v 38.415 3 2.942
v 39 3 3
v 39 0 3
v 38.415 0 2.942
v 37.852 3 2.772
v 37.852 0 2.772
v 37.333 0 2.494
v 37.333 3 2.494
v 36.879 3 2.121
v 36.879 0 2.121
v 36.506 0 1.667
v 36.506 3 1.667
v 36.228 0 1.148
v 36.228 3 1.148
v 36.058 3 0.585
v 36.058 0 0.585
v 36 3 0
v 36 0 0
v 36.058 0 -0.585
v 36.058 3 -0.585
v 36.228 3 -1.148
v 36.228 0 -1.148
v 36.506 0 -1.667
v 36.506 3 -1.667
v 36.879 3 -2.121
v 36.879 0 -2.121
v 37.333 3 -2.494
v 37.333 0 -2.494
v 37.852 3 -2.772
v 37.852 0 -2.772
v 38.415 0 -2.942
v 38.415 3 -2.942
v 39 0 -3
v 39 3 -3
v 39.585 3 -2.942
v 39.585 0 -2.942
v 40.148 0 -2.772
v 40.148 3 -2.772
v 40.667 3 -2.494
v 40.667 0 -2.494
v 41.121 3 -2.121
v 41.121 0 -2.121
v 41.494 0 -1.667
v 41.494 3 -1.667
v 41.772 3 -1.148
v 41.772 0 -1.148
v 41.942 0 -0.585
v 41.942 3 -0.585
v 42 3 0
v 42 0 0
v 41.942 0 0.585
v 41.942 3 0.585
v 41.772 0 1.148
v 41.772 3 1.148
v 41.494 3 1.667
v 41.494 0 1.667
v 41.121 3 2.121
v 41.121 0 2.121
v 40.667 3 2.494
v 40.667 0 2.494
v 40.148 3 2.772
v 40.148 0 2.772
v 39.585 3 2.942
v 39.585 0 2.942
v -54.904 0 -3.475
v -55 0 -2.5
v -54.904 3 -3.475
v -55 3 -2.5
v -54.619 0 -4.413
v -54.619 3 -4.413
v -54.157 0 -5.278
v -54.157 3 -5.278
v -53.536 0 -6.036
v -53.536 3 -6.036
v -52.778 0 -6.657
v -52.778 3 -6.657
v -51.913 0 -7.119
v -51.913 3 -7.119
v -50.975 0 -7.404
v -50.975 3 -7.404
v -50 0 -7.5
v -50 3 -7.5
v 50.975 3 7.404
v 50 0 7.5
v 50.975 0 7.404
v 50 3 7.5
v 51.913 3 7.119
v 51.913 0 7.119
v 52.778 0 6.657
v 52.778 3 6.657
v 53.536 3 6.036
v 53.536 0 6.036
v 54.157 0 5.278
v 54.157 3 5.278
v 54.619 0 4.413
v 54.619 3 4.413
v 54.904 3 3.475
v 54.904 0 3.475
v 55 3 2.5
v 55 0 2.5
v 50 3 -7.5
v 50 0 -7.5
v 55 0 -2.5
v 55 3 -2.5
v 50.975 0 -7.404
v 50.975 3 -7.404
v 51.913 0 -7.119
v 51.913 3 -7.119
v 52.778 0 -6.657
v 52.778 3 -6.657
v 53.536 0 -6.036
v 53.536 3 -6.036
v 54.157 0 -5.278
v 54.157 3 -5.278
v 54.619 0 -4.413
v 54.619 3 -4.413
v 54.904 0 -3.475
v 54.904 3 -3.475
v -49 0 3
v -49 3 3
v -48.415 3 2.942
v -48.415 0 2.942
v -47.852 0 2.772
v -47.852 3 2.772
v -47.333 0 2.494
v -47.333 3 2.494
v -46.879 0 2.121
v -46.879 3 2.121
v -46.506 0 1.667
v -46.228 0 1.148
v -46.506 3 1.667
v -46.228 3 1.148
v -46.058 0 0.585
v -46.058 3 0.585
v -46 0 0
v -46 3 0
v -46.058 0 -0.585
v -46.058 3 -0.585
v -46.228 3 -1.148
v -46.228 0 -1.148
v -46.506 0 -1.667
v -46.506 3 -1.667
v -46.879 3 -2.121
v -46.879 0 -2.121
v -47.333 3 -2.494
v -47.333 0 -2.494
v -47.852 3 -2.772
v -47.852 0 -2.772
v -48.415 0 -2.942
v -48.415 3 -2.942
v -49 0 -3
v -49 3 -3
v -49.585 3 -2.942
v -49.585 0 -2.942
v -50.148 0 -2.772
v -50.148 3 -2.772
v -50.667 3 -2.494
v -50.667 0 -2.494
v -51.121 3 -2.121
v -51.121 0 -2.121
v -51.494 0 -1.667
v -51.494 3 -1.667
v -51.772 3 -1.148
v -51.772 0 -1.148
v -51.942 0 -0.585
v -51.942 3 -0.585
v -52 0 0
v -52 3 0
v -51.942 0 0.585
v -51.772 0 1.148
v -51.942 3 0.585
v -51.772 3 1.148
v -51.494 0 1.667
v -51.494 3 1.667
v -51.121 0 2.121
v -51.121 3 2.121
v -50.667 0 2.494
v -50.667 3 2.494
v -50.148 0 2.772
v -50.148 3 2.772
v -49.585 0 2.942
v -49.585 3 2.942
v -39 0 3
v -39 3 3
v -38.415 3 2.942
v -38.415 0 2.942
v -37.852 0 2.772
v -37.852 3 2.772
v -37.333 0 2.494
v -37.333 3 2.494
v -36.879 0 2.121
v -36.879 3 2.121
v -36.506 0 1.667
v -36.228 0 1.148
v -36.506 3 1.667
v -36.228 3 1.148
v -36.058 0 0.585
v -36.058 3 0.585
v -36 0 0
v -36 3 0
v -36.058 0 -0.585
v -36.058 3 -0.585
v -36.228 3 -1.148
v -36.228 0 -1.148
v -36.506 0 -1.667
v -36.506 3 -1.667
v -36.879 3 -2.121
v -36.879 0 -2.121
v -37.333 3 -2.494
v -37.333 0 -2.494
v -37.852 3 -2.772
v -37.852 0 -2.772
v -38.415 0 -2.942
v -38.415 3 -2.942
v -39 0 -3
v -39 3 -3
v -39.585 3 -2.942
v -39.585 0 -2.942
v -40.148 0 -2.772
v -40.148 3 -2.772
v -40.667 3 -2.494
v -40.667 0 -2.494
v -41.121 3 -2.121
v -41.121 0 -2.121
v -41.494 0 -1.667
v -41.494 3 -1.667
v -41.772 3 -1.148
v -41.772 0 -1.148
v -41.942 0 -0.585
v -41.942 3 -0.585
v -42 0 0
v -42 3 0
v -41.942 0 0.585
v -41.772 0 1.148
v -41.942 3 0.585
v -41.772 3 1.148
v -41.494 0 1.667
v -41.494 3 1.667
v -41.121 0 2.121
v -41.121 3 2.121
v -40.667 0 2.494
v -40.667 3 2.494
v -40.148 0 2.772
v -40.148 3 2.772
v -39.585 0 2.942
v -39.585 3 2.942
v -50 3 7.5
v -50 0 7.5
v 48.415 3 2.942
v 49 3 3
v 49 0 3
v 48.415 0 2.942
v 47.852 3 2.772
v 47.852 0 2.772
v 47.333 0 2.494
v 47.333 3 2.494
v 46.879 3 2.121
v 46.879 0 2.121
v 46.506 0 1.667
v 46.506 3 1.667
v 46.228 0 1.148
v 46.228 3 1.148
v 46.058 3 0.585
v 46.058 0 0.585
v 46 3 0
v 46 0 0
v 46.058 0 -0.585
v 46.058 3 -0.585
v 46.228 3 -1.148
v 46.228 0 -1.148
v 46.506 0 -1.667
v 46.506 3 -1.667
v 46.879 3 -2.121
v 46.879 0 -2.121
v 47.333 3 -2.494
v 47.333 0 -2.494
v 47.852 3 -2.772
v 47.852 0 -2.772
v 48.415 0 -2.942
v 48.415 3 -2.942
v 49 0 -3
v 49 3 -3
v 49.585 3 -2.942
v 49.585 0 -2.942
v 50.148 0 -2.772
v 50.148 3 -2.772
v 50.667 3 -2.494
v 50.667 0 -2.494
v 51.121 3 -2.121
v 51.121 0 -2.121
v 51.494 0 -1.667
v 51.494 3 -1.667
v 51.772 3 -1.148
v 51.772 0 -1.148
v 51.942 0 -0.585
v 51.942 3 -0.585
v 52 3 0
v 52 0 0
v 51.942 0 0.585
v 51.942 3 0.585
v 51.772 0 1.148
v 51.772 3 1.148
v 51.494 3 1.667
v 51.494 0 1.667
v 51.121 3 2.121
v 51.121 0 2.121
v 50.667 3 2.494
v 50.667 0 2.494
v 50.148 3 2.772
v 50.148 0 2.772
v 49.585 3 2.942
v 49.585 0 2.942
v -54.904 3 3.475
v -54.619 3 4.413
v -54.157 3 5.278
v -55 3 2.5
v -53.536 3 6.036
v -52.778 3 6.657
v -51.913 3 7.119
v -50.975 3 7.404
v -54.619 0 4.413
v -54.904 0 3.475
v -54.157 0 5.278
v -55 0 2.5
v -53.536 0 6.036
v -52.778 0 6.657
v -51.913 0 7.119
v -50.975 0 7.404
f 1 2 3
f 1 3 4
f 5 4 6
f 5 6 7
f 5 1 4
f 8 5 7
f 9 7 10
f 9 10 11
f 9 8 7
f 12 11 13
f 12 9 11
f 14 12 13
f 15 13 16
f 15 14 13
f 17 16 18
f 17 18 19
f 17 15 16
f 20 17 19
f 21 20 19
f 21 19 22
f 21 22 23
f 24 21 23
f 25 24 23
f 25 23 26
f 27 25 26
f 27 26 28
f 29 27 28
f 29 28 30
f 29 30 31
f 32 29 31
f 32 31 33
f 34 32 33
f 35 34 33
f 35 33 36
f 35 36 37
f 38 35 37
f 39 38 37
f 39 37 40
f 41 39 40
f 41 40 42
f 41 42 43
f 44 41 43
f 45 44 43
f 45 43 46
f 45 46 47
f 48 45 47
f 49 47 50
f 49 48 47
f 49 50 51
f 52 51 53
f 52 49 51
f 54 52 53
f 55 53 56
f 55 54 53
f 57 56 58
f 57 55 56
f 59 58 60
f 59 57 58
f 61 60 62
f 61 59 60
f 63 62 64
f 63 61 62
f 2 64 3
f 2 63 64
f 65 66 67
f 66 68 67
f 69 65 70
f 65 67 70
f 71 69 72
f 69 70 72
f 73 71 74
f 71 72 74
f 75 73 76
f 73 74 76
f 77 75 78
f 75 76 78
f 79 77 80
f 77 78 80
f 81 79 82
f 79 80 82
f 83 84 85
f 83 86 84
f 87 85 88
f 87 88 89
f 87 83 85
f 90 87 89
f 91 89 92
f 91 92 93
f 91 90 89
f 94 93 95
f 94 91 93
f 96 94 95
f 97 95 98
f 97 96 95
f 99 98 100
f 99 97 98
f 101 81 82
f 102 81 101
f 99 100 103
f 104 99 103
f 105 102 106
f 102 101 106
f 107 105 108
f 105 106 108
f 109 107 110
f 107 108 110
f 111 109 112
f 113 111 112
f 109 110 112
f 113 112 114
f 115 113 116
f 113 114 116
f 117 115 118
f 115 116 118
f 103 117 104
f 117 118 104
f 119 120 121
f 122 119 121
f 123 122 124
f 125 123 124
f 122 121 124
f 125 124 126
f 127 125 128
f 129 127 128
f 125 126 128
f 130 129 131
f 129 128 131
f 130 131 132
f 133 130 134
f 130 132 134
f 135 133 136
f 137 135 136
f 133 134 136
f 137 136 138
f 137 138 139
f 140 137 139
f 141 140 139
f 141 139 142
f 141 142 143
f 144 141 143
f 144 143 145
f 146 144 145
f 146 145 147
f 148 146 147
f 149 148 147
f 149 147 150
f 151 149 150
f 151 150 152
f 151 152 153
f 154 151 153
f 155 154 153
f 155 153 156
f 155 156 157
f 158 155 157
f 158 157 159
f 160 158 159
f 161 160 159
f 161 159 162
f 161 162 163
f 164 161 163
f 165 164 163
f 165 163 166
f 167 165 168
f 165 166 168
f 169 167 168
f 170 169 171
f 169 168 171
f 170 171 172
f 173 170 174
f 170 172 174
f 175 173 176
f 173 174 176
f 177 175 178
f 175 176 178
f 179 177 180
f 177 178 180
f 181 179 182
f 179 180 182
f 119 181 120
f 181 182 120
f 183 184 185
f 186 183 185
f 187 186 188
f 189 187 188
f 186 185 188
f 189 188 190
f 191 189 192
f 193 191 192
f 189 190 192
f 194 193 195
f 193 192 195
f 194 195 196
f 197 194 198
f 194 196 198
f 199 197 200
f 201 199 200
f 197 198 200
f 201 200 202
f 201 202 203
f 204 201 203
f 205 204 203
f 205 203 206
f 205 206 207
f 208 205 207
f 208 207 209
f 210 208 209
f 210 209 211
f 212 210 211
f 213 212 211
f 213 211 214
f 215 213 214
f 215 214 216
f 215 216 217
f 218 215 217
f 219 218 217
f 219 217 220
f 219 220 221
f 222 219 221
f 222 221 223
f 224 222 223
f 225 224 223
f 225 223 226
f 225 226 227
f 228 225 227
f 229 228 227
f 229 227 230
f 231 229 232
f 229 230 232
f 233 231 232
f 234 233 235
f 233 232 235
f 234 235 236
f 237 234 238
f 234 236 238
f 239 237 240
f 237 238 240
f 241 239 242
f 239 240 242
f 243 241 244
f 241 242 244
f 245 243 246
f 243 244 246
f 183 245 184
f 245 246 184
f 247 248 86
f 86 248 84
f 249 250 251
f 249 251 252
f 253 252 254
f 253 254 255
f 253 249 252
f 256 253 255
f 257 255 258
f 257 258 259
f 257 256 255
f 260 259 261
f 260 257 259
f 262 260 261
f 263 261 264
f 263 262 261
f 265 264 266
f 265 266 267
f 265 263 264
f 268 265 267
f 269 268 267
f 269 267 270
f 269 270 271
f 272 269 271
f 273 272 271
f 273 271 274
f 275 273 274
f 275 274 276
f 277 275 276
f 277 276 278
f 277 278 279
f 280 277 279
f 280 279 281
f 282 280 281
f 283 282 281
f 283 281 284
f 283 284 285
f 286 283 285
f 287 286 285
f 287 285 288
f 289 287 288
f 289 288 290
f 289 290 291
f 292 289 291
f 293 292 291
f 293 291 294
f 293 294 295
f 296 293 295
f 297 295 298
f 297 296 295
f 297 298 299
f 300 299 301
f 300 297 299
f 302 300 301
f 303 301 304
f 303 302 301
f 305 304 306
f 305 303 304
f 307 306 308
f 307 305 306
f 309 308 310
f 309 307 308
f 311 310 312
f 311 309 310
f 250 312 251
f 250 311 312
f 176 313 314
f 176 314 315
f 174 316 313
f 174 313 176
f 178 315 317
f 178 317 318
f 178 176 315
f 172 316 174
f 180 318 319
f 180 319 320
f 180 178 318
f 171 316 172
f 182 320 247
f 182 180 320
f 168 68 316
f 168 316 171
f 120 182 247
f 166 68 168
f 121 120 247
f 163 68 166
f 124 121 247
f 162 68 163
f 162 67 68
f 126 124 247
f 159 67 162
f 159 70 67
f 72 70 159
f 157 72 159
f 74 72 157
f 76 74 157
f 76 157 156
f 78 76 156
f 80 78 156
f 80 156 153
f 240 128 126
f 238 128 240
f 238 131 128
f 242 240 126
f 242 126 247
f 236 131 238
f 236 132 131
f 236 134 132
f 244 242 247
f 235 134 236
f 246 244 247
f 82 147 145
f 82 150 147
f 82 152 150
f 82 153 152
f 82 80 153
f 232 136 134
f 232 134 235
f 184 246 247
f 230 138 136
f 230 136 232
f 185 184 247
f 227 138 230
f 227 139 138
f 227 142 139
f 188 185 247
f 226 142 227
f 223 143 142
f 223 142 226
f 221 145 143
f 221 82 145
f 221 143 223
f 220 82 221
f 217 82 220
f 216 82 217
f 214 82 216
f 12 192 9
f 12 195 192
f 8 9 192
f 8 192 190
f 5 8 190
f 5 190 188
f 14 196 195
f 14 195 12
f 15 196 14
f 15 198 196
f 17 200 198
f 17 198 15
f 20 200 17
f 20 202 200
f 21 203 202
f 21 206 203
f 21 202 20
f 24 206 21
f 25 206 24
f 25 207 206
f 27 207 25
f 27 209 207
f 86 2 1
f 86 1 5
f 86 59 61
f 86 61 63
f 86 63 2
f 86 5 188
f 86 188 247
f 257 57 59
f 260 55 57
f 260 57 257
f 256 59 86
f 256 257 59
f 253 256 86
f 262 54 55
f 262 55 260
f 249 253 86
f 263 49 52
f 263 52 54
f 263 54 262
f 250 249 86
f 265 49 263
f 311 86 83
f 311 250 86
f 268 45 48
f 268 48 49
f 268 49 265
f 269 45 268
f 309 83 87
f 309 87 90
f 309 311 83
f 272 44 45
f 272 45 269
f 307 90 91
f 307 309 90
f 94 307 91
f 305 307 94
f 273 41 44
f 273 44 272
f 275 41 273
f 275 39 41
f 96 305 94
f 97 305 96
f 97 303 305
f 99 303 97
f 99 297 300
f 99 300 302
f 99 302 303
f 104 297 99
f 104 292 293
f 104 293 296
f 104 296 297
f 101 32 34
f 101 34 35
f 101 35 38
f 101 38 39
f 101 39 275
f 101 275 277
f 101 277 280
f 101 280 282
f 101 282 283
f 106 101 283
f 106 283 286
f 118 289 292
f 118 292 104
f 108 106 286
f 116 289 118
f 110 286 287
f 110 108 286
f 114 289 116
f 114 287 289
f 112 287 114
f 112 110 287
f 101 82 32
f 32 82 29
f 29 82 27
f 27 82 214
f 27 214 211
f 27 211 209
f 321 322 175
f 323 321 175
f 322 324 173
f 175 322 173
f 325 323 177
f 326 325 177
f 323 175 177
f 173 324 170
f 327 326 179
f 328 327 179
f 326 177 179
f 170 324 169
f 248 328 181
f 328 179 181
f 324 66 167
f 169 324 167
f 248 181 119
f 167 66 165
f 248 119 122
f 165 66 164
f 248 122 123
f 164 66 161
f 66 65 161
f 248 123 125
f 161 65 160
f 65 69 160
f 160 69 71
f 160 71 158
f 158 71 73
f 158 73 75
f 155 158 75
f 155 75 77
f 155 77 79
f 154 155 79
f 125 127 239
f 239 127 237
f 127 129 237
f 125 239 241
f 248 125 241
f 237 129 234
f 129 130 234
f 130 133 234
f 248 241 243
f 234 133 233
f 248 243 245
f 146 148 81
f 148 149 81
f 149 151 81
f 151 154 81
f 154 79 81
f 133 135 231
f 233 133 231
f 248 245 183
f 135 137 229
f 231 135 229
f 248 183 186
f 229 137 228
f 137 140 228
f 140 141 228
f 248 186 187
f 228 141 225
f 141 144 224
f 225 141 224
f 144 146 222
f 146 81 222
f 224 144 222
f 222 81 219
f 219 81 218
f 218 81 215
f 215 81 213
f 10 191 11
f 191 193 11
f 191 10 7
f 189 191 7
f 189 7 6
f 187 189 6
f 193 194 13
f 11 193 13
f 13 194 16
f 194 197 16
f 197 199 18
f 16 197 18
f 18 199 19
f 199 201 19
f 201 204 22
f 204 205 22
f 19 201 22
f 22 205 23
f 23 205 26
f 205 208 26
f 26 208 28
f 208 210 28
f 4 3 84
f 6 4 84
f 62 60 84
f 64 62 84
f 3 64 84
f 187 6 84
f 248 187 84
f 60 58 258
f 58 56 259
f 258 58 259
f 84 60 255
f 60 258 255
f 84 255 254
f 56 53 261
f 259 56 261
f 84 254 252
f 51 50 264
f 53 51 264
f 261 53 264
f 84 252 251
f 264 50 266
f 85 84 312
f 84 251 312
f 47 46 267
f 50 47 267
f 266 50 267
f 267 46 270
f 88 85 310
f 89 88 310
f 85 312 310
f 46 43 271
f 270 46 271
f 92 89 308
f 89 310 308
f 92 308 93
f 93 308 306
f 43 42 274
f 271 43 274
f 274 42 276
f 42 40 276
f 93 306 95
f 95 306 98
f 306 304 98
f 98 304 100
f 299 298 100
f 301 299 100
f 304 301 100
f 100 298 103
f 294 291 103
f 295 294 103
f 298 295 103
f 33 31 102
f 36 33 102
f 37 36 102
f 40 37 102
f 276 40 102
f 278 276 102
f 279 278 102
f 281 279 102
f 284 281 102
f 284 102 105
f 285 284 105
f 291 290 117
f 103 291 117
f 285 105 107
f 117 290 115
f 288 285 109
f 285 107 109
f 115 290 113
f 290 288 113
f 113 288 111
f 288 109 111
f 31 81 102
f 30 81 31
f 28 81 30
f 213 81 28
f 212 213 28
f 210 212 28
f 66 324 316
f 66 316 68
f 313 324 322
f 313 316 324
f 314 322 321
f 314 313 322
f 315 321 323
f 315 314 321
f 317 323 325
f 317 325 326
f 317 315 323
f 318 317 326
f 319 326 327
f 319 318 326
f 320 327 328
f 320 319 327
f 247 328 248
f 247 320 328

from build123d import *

# Parameters (mm, degrees)
SKETCH1_W           = 110
SKETCH1_H           = 15
BOSS_EXTRUDE1_DEPTH = 3
CUT_EXTRUDE1_REACH  = 57.59
SKETCH2_R           = 3
FILLET1_R           = 5


with BuildPart() as part:
    # Sketch1 → Boss-Extrude1 (new body)
    with BuildSketch(Plane(origin=(0, 0, 0), x_dir=(1, 0, 0), z_dir=(0, 1, 0))):
        Rectangle(SKETCH1_W, SKETCH1_H)
    extrude(amount=BOSS_EXTRUDE1_DEPTH)

    # Sketch2 → Cut-Extrude1 (cut, up to next)
    with BuildSketch(Plane(origin=(0, 3, 0), x_dir=(1, 0, 0), z_dir=(0, 1, 0)), mode=Mode.PRIVATE) as cut_extrude1_sk1:
        with Locations(Location((-49, 0, 0), (0, 0, 270))):
            Circle(SKETCH2_R)
    cut_extrude1_tool1 = extrude(cut_extrude1_sk1.sketch, amount=-CUT_EXTRUDE1_REACH, mode=Mode.PRIVATE) & part.part
    # Sketch2 → Cut-Extrude1 (cut, up to next)
    with BuildSketch(Plane(origin=(0, 3, 0), x_dir=(1, 0, 0), z_dir=(0, 1, 0)), mode=Mode.PRIVATE) as cut_extrude1_sk2:
        with Locations(Location((-39, 0, 0), (0, 0, 270))):
            Circle(SKETCH2_R)
    cut_extrude1_tool2 = extrude(cut_extrude1_sk2.sketch, amount=-CUT_EXTRUDE1_REACH, mode=Mode.PRIVATE) & part.part
    cut_extrude1_1 = cut_extrude1_tool1.solids().sort_by_distance((-49, 3, 0))[0]
    add(cut_extrude1_1, mode=Mode.SUBTRACT)
    cut_extrude1_2 = cut_extrude1_tool2.solids().sort_by_distance((-39, 3, 0))[0]
    add(cut_extrude1_2, mode=Mode.SUBTRACT)
    cut_extrude1 = cut_extrude1_1 + cut_extrude1_2  # Cut-Extrude1 as one shape, for the pattern or mirror that repeats it

    # Mirror1: Cut-Extrude1 across plane
    add(cut_extrude1.mirror(Plane(origin=(0, 0, 0), x_dir=(0, 0, 1), z_dir=(1, 0, 0))), mode=Mode.SUBTRACT)

    # Fillet1
    fillet1_edges = [part.edges().sort_by_distance(p)[0] for p in [
        (-55, 1.5, -7.5),
        (55, 1.5, -7.5),
        (55, 1.5, 7.5),
        (-55, 1.5, 7.5),
    ]]
    fillet(fillet1_edges, radius=FILLET1_R)


solid = part.part
